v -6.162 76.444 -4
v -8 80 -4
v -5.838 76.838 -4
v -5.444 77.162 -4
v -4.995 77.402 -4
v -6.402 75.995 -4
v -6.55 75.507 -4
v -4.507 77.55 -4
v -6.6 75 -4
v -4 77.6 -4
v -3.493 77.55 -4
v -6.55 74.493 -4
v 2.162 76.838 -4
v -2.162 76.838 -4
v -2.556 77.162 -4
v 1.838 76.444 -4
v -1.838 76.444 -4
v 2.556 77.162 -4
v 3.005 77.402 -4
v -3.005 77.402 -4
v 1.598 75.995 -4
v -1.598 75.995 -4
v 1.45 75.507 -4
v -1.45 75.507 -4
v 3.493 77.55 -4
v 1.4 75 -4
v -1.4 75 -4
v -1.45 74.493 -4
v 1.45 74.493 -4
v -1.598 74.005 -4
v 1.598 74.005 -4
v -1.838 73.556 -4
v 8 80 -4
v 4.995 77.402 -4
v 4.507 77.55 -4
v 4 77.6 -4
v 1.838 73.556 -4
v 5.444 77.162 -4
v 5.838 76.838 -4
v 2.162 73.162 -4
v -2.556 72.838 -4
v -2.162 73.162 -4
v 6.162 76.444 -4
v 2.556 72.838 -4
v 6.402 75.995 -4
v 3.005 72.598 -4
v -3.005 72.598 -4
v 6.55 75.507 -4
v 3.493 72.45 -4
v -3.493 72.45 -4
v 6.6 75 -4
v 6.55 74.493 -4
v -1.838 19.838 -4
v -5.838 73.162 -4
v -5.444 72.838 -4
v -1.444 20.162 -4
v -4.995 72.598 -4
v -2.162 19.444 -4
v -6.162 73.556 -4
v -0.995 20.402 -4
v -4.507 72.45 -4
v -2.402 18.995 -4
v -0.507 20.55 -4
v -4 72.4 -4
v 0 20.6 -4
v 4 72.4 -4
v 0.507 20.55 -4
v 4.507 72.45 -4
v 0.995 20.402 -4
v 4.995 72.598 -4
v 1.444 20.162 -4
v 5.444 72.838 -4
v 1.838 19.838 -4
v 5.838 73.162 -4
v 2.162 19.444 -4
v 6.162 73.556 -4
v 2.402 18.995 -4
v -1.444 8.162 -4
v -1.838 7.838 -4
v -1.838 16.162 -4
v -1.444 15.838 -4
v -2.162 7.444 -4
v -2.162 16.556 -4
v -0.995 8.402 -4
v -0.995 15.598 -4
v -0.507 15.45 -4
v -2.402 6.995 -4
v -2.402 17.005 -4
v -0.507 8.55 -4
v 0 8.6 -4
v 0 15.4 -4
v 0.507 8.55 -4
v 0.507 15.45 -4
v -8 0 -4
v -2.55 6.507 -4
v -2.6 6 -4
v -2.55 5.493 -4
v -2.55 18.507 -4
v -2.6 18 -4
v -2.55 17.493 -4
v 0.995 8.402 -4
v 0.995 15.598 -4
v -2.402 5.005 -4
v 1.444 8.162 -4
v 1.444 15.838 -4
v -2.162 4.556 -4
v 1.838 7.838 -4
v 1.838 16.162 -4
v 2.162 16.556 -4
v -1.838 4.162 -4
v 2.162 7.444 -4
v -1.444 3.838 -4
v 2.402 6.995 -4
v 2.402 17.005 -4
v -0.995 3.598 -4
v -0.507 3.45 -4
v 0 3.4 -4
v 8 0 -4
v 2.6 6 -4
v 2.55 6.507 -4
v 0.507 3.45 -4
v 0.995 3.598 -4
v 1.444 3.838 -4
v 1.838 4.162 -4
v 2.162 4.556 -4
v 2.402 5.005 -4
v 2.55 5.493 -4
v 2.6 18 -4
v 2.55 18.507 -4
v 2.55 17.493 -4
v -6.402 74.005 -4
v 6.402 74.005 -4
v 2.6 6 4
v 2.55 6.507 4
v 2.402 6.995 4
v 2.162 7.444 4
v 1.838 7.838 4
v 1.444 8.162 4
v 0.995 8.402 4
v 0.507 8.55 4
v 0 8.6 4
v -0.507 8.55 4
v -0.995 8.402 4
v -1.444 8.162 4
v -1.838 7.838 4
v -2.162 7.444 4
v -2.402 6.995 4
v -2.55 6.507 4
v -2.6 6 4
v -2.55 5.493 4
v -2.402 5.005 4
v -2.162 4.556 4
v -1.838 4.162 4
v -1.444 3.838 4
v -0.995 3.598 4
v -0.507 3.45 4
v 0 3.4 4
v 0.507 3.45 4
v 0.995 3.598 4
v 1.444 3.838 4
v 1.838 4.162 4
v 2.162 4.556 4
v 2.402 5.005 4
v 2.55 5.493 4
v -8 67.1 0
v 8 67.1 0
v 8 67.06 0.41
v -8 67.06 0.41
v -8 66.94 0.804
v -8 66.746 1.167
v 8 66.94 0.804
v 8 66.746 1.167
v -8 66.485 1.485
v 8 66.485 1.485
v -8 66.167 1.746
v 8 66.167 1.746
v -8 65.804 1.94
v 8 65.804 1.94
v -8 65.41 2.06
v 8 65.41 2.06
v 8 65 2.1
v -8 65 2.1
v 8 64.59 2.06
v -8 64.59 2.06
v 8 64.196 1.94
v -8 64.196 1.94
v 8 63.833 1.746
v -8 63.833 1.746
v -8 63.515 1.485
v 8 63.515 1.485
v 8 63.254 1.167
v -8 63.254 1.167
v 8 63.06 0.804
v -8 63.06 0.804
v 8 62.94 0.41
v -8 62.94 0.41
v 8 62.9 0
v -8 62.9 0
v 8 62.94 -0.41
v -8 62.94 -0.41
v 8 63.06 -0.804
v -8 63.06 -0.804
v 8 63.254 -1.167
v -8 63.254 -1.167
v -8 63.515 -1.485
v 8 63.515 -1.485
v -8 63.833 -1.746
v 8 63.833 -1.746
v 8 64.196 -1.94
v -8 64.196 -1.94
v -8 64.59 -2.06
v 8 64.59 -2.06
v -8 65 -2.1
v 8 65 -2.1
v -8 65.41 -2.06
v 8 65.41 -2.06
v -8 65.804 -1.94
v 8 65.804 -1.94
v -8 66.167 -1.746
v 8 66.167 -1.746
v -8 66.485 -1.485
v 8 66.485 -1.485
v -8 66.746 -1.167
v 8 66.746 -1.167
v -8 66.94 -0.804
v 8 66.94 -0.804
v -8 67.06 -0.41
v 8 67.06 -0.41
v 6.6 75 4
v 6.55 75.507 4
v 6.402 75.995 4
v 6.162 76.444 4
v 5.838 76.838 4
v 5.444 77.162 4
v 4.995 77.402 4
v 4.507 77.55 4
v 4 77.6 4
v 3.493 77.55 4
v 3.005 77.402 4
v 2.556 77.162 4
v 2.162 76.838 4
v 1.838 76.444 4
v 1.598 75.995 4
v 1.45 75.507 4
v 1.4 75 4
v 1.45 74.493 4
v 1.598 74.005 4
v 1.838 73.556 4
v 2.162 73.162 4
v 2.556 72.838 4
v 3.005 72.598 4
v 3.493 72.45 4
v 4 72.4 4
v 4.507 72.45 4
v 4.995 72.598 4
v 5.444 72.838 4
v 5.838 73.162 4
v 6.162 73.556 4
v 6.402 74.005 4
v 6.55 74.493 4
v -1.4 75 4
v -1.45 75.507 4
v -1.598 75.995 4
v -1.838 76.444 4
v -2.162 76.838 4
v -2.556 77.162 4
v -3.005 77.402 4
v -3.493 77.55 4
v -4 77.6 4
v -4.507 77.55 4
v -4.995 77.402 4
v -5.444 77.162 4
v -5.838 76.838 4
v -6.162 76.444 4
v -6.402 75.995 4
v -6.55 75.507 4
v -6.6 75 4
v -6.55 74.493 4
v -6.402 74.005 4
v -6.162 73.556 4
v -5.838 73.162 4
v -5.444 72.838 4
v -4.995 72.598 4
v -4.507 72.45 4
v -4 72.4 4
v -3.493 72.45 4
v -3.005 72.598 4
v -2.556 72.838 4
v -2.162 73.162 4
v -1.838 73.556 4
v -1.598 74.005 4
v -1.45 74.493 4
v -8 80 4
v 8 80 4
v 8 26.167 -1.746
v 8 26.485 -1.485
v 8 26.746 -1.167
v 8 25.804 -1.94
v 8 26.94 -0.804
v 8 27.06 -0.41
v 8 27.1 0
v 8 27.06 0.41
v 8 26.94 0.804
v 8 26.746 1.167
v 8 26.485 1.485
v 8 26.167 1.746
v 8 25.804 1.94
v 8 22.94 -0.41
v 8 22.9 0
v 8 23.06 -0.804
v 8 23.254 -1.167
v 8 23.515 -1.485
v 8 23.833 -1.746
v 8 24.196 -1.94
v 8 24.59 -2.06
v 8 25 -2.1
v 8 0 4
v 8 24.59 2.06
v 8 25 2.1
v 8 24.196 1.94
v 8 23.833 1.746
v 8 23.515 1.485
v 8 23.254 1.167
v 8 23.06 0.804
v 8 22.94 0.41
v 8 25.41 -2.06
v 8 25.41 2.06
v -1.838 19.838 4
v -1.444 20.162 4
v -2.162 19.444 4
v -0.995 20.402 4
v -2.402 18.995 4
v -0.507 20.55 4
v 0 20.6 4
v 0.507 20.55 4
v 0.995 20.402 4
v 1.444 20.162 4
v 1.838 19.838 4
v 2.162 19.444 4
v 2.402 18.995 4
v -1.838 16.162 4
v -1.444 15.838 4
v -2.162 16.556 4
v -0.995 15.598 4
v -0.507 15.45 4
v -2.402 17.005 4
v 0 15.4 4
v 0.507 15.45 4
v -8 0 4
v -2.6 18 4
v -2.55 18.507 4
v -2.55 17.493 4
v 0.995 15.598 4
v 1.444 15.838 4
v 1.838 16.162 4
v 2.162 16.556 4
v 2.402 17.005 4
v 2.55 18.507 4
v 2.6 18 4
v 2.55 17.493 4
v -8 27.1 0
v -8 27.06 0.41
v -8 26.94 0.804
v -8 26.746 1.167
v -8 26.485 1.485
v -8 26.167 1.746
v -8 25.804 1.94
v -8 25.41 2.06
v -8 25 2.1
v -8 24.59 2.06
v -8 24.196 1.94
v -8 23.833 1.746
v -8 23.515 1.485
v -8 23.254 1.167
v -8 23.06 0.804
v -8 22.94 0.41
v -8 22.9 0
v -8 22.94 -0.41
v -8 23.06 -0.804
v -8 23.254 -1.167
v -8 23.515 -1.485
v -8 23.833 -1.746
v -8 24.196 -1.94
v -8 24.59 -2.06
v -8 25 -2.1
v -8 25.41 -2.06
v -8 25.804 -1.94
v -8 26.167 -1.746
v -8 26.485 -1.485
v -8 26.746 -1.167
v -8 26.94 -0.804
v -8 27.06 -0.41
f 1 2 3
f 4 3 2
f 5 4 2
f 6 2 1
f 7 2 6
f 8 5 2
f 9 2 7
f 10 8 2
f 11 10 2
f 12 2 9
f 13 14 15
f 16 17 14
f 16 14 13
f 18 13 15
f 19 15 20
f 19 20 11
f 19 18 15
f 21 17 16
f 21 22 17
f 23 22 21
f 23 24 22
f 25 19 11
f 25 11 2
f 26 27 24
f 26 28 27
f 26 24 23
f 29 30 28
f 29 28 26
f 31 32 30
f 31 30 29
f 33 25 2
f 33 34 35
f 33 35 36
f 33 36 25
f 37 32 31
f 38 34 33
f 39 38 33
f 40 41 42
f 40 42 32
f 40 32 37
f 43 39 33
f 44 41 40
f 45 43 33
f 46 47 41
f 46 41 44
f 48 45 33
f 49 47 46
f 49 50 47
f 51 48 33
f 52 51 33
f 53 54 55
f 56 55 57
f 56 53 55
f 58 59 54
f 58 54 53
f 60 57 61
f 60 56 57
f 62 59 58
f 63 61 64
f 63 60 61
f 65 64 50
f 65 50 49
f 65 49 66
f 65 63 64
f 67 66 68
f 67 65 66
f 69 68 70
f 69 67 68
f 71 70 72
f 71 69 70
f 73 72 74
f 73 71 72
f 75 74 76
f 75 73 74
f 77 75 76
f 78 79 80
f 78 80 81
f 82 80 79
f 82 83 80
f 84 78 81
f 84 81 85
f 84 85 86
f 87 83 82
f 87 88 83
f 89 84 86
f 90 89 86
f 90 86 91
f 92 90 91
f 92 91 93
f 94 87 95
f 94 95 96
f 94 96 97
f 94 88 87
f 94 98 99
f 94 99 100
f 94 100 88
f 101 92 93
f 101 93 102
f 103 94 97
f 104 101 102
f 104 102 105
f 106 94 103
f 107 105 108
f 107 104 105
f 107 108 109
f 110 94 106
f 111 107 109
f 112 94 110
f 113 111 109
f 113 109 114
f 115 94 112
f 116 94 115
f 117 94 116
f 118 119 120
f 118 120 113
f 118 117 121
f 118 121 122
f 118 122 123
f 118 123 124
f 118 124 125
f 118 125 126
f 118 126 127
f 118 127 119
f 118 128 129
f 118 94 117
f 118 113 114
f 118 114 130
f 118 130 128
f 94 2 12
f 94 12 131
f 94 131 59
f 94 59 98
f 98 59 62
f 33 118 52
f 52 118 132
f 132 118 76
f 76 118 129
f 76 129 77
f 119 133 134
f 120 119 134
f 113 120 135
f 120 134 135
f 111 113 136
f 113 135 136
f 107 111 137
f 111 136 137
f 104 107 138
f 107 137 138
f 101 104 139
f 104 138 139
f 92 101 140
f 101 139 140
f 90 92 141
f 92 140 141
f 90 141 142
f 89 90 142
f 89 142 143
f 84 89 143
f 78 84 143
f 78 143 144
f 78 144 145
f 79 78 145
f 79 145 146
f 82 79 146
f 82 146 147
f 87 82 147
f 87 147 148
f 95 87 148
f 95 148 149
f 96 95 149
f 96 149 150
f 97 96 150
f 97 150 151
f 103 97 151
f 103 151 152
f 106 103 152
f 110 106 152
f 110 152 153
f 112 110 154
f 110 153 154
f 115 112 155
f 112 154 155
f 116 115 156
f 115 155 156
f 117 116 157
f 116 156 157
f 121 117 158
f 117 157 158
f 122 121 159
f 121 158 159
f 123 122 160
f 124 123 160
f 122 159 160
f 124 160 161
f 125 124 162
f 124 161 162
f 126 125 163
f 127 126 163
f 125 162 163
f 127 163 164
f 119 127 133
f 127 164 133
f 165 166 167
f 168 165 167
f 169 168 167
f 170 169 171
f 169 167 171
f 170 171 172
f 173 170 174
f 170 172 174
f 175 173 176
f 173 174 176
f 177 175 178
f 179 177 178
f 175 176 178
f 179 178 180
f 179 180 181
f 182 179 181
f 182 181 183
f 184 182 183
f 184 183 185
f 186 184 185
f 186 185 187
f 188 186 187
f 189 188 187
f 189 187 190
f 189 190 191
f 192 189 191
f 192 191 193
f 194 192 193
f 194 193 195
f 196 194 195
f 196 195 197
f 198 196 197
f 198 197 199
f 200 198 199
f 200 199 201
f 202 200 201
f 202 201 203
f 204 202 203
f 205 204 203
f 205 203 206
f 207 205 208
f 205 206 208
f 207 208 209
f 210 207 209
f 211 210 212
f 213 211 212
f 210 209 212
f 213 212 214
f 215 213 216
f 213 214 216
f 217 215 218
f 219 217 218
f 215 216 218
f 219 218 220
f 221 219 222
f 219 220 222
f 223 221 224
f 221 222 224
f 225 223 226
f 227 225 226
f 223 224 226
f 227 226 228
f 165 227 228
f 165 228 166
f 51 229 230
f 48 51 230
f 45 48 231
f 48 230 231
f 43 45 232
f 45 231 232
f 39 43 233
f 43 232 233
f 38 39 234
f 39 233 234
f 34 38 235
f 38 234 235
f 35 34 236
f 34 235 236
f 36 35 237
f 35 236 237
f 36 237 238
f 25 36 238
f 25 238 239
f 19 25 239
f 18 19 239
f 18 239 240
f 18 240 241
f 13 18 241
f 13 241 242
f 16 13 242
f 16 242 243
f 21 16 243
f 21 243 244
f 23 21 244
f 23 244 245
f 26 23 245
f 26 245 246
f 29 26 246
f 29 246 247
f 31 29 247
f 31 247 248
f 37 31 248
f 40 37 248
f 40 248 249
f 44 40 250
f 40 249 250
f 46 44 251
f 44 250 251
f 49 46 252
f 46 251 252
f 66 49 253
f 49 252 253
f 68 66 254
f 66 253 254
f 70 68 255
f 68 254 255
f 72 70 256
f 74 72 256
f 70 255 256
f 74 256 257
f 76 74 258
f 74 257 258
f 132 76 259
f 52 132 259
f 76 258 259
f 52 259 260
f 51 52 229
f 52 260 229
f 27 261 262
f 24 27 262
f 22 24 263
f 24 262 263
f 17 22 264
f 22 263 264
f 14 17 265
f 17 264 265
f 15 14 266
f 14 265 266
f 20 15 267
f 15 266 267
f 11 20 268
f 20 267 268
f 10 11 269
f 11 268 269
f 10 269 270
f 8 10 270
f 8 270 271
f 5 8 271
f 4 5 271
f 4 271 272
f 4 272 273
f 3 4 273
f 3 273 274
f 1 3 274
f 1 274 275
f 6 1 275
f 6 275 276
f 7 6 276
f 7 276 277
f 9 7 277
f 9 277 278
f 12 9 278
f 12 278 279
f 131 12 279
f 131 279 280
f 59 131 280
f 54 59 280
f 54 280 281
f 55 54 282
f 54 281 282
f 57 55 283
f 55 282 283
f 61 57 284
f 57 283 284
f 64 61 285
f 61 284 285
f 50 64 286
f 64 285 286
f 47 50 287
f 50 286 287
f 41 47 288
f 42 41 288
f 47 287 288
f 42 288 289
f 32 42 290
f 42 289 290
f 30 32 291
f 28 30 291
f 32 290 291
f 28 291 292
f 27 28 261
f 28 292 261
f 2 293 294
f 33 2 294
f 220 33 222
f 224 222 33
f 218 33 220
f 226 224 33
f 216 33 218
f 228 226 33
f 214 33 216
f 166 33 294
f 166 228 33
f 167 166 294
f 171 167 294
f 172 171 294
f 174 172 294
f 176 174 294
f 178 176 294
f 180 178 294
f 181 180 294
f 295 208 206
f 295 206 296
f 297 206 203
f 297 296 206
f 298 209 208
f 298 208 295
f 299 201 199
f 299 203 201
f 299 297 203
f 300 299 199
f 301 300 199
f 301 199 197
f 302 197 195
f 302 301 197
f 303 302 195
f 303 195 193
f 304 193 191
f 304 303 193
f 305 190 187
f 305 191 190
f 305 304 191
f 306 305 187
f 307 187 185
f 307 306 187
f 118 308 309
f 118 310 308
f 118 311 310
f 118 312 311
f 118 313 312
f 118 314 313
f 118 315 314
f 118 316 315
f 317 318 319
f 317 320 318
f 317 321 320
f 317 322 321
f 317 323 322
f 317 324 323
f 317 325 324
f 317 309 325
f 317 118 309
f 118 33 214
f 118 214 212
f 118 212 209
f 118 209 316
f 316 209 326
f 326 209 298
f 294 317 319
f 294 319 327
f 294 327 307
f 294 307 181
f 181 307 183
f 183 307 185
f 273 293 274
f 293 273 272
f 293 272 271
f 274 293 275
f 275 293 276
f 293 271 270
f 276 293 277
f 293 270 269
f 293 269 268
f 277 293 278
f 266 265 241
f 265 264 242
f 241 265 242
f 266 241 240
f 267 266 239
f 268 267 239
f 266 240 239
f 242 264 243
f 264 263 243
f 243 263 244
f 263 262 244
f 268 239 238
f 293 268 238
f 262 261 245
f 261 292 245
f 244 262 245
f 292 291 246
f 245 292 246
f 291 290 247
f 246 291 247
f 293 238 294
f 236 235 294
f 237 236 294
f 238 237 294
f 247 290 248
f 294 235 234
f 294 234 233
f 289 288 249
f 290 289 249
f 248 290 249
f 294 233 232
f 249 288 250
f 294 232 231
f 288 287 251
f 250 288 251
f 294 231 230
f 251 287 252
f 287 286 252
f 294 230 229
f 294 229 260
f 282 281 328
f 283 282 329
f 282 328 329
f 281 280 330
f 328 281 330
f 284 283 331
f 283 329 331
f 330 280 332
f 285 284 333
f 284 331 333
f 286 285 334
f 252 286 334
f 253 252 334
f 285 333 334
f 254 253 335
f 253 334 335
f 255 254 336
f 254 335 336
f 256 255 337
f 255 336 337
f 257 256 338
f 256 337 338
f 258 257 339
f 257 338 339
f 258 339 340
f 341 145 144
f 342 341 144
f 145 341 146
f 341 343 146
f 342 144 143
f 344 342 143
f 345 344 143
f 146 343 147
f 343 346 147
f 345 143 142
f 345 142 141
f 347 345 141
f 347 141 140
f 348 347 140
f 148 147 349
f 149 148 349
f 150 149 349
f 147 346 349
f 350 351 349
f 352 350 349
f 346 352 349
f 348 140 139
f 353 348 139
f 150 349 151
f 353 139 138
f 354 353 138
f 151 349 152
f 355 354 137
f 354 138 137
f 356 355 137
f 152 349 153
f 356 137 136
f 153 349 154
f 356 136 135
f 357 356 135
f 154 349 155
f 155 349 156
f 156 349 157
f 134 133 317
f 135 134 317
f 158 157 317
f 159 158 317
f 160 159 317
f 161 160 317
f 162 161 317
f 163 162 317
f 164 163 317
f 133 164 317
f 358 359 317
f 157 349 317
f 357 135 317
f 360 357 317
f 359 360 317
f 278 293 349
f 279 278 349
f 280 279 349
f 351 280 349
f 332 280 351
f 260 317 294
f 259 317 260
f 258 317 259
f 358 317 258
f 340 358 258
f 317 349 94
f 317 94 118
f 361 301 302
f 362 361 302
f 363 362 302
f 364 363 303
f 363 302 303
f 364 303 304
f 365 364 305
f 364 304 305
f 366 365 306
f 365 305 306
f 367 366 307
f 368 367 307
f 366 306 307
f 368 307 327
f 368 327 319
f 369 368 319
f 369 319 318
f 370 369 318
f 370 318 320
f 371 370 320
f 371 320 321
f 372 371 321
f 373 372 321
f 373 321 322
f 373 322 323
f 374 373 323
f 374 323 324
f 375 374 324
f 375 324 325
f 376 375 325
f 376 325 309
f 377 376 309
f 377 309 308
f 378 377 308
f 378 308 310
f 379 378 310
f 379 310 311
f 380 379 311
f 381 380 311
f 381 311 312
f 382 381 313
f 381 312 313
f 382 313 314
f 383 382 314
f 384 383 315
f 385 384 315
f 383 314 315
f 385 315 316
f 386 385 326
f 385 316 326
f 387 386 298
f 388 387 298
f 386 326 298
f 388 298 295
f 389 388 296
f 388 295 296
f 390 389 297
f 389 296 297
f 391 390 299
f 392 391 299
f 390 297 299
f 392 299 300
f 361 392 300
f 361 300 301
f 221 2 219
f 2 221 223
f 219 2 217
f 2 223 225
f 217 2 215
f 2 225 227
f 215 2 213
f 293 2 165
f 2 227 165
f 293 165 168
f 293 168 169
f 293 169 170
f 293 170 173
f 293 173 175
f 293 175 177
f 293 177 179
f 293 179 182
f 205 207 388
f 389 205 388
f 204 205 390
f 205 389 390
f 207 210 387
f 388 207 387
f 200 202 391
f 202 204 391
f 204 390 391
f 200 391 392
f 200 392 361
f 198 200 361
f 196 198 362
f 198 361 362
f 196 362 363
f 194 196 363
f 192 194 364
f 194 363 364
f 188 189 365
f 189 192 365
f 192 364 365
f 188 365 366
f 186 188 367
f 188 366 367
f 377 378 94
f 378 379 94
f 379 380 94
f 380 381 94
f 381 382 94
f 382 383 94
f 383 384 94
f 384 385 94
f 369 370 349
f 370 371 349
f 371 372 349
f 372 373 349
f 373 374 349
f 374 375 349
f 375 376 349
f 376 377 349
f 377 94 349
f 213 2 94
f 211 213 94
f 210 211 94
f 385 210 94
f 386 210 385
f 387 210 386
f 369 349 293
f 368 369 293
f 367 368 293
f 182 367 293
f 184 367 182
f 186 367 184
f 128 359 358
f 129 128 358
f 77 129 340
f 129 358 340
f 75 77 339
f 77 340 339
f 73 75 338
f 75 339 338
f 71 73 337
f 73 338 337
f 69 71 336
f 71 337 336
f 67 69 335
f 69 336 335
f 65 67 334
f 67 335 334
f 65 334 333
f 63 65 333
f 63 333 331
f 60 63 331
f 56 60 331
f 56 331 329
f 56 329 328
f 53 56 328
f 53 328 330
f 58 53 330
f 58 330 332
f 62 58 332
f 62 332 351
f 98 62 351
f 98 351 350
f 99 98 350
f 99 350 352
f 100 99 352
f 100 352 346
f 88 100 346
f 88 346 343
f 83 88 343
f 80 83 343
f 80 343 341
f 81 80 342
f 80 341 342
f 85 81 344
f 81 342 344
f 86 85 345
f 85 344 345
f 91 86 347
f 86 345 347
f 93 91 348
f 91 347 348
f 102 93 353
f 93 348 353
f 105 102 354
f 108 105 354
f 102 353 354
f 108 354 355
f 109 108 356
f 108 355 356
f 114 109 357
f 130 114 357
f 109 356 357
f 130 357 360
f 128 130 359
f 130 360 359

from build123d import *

# Parameters (mm, degrees)
F0_W          = 16
F0_H          = 8
F1_DEPTH      = 80
F2_R          = 2.6
F4_DEPTH      = 25
F4_DEPTH_BACK = 25
F5_D          = 4.2
F5_DEPTH      = 18.4
F5_TIP        = 1.2618073


with BuildPart() as f1:
    # F0 (on Front) → F1 (new body)
    with BuildSketch(Plane.XZ):
        Rectangle(F0_W, F0_H)
    extrude(amount=-F1_DEPTH)

    # F2 (on face) → F4 (cut, two sides)
    with BuildSketch(Plane.XY.offset(4)) as f4_sk:
        with Locations((0, 18)):
            Circle(F2_R)
        with Locations((0, 6)):
            Circle(F2_R)
        with Locations((4, 75)):
            Circle(F2_R)
        with Locations((-4, 75)):
            Circle(F2_R)
    extrude(amount=-F4_DEPTH, mode=Mode.SUBTRACT)
    extrude(f4_sk.sketch, amount=F4_DEPTH_BACK, mode=Mode.SUBTRACT)

    # F5
    with Locations(Plane(origin=(-8, 0, 0), x_dir=(0, -1, 0), z_dir=(-1, 0, 0))):
        with Locations((-65, 0), (-25, 0)):
            Hole(F5_D / 2, depth=F5_DEPTH)
            with Locations((0, 0, -(F5_DEPTH + F5_TIP / 2))):  # 118° drill point
                Cone(0, F5_D / 2, F5_TIP, mode=Mode.SUBTRACT)


solid = f1.part
